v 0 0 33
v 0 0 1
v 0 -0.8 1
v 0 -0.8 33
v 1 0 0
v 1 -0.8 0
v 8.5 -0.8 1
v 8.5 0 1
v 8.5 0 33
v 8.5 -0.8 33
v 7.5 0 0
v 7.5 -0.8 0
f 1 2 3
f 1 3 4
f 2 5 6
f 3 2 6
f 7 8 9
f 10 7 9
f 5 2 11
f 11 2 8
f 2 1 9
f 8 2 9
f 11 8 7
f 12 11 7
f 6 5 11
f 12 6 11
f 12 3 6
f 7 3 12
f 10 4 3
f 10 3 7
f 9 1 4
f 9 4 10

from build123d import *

# Parameters (mm, degrees)
F0_W     = 8.5
F0_H     = 33
F1_DEPTH = 0.8
F2_SIZE  = 1


with BuildPart() as f1:
    # F0 (on Front) → F1 (new body)
    with BuildSketch(Plane.XZ):
        with Locations((4.25, 16.5)):
            Rectangle(F0_W, F0_H)
    extrude(amount=F1_DEPTH)

    # F2
    f2_edges = [f1.edges().sort_by_distance(p)[0] for p in [
        (8.5, -0.4, 0),
        (0, -0.4, 0),
    ]]
    chamfer(f2_edges, length=F2_SIZE)


solid = f1.part
